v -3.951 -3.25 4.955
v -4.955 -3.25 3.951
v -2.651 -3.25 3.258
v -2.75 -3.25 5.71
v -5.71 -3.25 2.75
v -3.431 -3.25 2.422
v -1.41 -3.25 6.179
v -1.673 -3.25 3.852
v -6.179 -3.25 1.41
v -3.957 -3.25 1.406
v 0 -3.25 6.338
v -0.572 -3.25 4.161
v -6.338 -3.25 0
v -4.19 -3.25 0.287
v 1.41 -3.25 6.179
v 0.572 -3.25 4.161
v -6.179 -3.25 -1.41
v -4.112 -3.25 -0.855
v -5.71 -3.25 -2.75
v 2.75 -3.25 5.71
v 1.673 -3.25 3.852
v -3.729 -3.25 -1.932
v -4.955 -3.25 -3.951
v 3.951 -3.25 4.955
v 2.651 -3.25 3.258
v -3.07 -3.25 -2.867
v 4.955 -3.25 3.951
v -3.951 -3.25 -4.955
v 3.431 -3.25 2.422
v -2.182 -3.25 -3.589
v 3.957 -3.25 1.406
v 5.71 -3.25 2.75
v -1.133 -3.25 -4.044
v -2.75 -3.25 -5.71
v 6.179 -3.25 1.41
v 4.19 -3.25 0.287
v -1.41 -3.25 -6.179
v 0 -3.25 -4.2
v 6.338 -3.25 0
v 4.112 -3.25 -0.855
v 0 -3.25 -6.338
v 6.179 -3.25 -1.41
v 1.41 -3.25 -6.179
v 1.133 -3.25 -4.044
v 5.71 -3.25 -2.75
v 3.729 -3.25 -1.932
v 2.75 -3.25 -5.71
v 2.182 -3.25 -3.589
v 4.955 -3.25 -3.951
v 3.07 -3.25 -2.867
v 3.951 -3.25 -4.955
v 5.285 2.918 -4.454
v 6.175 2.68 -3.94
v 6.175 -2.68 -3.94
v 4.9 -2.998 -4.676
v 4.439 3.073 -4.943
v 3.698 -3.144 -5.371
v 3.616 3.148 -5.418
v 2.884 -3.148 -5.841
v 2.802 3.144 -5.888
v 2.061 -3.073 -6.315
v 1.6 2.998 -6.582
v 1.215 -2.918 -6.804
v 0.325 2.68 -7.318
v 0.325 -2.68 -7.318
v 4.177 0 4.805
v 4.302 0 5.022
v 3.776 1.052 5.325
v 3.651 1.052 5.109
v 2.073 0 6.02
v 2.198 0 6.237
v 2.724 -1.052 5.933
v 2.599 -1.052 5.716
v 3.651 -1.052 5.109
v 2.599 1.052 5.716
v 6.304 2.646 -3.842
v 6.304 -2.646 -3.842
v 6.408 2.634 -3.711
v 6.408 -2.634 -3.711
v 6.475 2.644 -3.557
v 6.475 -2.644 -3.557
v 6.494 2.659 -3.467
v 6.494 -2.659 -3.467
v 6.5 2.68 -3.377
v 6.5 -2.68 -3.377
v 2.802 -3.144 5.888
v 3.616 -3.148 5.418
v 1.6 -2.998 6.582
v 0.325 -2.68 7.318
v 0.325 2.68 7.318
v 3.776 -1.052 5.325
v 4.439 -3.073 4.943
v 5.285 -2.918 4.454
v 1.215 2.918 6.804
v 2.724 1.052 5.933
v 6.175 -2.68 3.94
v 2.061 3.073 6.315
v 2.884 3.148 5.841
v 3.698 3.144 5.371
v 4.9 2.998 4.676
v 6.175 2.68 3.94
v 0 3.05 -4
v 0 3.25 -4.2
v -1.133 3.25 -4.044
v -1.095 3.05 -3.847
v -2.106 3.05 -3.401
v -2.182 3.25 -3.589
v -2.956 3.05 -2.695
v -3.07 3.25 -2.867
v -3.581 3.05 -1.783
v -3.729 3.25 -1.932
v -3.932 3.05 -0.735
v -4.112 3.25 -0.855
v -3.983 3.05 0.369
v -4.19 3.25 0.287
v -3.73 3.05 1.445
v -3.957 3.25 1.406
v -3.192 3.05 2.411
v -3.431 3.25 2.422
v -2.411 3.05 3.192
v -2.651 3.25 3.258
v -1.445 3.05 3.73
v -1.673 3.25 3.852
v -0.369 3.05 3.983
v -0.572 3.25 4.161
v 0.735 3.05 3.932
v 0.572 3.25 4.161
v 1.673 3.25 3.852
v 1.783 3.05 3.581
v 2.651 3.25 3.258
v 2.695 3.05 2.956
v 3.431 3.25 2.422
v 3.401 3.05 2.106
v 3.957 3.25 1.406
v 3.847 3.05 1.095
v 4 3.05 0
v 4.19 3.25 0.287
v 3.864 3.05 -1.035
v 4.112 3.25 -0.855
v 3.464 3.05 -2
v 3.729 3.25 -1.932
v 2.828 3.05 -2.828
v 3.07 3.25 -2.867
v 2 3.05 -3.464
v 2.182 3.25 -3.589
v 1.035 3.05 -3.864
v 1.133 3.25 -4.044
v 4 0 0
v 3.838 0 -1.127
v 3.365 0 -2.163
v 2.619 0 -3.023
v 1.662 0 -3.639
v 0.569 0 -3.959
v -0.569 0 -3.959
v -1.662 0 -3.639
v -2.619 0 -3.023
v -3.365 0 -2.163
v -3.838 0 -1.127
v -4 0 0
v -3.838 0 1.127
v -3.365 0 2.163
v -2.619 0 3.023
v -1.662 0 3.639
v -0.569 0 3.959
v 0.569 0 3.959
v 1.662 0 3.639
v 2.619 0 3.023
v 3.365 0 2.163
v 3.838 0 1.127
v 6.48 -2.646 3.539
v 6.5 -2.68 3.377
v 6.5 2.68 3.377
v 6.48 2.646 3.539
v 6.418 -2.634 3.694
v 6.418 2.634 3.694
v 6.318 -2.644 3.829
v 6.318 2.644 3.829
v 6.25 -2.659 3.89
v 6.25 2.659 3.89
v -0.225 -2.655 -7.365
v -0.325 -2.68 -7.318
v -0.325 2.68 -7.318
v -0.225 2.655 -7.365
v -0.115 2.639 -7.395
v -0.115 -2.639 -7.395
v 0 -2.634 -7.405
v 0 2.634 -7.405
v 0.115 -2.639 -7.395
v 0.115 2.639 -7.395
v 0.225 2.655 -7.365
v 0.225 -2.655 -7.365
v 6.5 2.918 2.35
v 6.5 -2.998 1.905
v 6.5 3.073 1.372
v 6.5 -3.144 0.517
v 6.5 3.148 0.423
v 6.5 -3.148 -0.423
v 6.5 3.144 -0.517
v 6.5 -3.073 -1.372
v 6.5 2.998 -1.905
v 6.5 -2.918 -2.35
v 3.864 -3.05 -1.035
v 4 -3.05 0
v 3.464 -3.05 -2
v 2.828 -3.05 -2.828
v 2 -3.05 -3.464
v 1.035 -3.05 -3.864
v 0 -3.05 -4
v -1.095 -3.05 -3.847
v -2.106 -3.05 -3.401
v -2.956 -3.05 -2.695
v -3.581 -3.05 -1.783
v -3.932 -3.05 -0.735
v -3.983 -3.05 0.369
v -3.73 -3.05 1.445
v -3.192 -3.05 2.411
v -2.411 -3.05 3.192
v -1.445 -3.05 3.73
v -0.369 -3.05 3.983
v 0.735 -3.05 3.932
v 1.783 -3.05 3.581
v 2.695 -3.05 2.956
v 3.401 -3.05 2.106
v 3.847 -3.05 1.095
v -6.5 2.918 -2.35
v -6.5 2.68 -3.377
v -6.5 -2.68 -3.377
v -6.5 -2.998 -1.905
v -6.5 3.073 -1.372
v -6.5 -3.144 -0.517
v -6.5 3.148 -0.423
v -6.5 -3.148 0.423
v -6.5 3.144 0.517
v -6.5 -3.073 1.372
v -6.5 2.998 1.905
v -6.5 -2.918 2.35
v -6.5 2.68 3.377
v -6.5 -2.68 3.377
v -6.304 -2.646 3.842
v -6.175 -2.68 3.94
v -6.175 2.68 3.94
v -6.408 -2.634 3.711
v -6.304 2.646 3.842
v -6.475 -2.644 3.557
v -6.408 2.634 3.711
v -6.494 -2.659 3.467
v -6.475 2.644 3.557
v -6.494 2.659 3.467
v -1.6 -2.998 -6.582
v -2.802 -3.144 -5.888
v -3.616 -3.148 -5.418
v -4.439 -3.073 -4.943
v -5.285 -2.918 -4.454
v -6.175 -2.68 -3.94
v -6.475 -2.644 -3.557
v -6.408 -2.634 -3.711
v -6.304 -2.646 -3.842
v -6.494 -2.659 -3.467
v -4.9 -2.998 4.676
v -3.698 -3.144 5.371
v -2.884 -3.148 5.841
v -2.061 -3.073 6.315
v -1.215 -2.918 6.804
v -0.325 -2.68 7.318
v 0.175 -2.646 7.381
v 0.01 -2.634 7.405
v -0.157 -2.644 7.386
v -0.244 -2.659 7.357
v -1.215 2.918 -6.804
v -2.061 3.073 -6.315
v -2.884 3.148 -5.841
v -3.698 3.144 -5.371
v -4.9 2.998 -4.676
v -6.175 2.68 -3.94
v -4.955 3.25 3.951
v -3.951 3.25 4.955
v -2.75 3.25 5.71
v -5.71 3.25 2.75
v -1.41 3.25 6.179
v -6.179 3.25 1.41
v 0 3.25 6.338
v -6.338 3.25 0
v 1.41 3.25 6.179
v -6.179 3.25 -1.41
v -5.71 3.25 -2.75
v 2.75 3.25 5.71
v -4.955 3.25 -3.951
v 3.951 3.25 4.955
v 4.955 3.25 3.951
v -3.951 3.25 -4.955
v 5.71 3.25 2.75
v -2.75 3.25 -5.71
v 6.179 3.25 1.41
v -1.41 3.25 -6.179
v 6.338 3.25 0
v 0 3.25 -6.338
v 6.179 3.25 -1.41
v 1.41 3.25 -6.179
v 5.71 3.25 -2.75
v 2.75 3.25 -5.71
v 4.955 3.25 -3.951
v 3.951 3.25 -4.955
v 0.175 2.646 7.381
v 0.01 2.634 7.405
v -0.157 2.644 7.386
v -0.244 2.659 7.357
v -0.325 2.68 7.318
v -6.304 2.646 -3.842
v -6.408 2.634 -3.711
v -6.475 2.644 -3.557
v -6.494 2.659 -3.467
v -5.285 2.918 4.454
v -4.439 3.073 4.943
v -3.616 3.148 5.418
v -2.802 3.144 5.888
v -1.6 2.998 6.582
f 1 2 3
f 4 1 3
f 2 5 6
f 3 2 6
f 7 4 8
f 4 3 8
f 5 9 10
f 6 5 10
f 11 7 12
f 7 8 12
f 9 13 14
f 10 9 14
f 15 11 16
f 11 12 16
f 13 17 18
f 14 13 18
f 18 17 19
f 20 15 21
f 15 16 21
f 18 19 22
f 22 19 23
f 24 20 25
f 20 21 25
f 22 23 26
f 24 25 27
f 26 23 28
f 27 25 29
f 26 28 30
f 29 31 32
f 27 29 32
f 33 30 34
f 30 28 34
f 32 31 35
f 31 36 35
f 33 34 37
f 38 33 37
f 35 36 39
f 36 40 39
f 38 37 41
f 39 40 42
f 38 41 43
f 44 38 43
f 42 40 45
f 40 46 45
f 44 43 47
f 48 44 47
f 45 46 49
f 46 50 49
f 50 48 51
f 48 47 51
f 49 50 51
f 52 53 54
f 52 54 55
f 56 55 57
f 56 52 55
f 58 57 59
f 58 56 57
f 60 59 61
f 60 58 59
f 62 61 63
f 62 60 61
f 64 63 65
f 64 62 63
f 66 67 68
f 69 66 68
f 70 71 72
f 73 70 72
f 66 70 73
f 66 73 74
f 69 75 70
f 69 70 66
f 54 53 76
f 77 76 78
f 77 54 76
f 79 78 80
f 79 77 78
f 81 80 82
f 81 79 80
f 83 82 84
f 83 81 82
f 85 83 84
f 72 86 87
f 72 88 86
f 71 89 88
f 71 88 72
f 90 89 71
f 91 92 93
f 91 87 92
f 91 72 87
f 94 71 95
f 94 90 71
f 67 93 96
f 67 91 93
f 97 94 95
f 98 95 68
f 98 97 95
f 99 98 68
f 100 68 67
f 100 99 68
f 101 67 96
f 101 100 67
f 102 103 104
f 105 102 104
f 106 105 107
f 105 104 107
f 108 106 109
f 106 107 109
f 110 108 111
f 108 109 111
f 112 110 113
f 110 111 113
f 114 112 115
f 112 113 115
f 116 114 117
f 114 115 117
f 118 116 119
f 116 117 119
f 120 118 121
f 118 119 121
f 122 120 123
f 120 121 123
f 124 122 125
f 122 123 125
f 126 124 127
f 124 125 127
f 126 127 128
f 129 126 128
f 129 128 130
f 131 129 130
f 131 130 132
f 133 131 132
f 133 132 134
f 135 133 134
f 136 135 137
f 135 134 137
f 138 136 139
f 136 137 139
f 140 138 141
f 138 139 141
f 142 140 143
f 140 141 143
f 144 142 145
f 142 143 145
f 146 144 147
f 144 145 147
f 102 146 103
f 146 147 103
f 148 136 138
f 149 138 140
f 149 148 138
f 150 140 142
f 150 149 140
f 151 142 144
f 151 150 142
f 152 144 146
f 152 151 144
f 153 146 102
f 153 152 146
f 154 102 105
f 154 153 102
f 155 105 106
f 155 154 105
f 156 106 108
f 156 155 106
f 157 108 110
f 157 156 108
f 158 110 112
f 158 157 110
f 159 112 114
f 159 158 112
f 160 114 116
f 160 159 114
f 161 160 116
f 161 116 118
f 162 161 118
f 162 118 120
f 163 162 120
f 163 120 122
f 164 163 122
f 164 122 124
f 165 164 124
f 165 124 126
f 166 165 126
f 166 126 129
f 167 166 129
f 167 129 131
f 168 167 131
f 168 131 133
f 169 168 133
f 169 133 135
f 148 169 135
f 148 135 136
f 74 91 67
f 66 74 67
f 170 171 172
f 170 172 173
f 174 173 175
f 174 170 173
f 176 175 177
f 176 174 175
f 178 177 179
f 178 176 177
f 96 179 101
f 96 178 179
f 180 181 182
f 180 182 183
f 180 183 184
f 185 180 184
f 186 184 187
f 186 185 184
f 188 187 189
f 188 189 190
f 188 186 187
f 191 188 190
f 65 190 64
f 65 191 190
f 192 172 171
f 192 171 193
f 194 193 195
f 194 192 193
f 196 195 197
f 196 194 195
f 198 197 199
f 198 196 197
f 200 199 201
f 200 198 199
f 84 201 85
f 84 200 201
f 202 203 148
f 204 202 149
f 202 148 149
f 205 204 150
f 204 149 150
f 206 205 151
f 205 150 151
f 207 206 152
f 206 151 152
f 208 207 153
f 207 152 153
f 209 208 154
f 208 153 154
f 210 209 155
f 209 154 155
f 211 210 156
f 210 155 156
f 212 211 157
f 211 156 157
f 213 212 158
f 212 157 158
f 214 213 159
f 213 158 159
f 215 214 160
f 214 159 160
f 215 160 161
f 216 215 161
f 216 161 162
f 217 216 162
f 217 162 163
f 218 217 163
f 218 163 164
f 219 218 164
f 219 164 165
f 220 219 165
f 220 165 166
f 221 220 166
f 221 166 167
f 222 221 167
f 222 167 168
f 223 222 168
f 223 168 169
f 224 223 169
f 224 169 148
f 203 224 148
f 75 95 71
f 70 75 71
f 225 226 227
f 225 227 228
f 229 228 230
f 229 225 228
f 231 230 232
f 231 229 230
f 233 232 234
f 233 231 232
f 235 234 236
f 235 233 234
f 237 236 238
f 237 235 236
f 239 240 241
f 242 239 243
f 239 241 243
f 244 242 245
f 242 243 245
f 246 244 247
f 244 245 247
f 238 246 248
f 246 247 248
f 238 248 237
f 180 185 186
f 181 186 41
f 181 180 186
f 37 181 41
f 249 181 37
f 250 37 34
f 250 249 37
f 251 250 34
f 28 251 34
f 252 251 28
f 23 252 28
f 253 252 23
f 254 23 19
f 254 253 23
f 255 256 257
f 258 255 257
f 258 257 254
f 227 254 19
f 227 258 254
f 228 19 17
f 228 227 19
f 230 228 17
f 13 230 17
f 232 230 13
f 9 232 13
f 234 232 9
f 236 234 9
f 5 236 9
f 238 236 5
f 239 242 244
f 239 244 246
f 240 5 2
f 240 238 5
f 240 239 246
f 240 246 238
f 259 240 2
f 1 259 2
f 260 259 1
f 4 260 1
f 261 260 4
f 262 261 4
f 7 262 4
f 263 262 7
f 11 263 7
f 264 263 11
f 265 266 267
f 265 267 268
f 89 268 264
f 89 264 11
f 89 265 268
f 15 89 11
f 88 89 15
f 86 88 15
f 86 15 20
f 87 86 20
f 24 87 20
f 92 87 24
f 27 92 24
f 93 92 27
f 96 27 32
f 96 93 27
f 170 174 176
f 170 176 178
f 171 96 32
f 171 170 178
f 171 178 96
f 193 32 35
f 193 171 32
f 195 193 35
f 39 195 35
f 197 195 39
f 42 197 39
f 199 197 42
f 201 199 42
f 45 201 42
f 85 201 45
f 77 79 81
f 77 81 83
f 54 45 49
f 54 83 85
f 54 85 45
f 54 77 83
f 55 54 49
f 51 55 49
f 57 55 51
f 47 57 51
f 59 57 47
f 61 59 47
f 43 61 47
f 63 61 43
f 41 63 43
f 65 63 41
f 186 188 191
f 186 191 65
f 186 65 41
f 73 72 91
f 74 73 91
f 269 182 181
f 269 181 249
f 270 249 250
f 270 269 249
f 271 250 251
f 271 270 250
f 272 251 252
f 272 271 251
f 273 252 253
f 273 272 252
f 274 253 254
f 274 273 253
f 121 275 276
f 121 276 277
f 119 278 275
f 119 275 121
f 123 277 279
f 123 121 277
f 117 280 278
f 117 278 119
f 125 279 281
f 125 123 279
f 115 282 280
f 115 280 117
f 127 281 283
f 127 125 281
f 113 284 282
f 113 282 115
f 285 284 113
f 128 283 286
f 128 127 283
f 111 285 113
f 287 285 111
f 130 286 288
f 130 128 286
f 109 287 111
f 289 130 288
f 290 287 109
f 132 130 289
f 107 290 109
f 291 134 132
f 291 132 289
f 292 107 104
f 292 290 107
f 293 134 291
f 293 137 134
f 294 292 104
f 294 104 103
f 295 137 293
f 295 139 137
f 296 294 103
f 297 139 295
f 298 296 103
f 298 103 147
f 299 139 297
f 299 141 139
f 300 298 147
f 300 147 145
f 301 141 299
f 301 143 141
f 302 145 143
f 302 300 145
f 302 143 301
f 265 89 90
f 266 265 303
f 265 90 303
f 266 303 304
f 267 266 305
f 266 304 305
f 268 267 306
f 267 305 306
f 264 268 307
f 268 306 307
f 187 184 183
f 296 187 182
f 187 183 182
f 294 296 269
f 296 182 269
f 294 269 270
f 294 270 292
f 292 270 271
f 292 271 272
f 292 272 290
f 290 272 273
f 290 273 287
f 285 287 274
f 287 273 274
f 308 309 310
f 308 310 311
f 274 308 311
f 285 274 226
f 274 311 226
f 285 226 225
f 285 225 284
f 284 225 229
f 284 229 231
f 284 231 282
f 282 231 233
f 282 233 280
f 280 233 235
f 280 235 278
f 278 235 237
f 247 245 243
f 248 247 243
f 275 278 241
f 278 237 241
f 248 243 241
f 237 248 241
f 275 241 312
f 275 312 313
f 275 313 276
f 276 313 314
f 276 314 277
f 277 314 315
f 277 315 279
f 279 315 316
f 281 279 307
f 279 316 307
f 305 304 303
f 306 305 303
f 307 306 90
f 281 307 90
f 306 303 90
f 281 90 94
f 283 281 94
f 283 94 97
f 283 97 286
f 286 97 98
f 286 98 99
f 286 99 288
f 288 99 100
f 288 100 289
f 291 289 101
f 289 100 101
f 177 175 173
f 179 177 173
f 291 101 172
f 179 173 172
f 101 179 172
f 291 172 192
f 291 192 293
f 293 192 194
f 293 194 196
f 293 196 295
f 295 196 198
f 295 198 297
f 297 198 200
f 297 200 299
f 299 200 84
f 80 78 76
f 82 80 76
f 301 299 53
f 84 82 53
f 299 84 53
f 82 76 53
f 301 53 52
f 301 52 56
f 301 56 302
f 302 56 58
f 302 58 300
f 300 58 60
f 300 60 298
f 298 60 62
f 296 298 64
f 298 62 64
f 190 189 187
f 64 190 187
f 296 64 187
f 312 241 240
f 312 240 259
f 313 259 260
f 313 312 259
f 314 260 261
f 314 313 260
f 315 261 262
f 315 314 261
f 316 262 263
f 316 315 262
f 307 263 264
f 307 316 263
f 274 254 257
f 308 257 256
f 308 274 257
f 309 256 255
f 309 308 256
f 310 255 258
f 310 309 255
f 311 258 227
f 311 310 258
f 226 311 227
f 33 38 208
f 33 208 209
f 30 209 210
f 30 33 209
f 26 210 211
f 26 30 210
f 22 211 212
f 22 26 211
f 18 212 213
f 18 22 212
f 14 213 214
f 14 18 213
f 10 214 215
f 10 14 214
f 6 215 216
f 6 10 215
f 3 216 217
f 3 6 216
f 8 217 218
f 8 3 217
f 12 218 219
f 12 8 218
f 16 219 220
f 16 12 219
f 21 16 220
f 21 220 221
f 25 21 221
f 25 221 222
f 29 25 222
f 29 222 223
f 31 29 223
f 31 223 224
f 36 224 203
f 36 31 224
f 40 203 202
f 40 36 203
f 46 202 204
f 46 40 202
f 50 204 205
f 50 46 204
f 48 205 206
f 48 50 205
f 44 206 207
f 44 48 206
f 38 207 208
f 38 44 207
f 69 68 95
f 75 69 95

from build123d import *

# Parameters (mm, degrees)
SKETCH2_R                = 4
BOSS_EXTRUDE1_DEPTH      = 3.25
BOSS_EXTRUDE1_DEPTH_BACK = 3.25
FILLET1_R                = 0.65
CUT_EXTRUDE2_DEPTH       = 0.25


with BuildPart() as part:
    # Sketch2 → Boss-Extrude1 (new body, two sides)
    with BuildSketch(Plane(origin=(0, 0, 0), x_dir=(1, 0, 0), z_dir=(0, 1, 0))) as boss_extrude1_sk:
        Polygon((0, 7.505553499), (-6.5, 3.75277675), (-6.5, -3.75277675), (0, -7.505553499), (6.5, -3.75277675), (6.5, 3.75277675), align=None)
        Circle(SKETCH2_R, mode=Mode.SUBTRACT)
    extrude(amount=BOSS_EXTRUDE1_DEPTH)
    extrude(boss_extrude1_sk.sketch, amount=-BOSS_EXTRUDE1_DEPTH_BACK)

    # Fillet1
    fillet1_edges = [part.edges().sort_by_distance(p)[0] for p in [
        (6.5, 0, -3.75277675),
        (6.5, 0, 3.75277675),
        (0, 0, 7.505553499),
        (-6.5, 0, 3.75277675),
        (-6.5, 0, -3.75277675),
        (0, 0, -7.505553499),
    ]]
    fillet(fillet1_edges, radius=FILLET1_R)

    # Sketch3 → Cut-Revolve2 (revolve, cut)
    with BuildSketch(Plane(origin=(0, 0, 0), x_dir=(0, 0, -1), z_dir=(1, 0, 0))):
        Polygon((6.3375, -3.25), (7.505553499, -2.575623998), (7.505553499, -3.25), align=None)
        Polygon((4, 3.25), (4, 3.05), (4.2, 3.25), align=None)
        Polygon((4, -3.25), (4, -3.05), (4.2, -3.25), align=None)
        Polygon((6.3375, 3.25), (7.505553499, 2.575623998), (7.505553499, 3.25), align=None)
    revolve(axis=Axis((0, -3.25, 0), (0, 1, 0)), mode=Mode.SUBTRACT)

    # Sketch12 → Cut-Extrude2 (cut)
    with BuildSketch(Plane(origin=(3.25, 0, 5.629165125), x_dir=(0.866025404, 0, -0.5), z_dir=(0.5, 0, 0.866025404))):
        Polygon((-1.214814445, 0), (-0.607407223, -1.05206017), (0.607407223, -1.05206017), (1.214814445, 0), (0.607407223, 1.05206017), (-0.607407223, 1.05206017), align=None)
    extrude(amount=-CUT_EXTRUDE2_DEPTH, mode=Mode.SUBTRACT)


solid = part.part
